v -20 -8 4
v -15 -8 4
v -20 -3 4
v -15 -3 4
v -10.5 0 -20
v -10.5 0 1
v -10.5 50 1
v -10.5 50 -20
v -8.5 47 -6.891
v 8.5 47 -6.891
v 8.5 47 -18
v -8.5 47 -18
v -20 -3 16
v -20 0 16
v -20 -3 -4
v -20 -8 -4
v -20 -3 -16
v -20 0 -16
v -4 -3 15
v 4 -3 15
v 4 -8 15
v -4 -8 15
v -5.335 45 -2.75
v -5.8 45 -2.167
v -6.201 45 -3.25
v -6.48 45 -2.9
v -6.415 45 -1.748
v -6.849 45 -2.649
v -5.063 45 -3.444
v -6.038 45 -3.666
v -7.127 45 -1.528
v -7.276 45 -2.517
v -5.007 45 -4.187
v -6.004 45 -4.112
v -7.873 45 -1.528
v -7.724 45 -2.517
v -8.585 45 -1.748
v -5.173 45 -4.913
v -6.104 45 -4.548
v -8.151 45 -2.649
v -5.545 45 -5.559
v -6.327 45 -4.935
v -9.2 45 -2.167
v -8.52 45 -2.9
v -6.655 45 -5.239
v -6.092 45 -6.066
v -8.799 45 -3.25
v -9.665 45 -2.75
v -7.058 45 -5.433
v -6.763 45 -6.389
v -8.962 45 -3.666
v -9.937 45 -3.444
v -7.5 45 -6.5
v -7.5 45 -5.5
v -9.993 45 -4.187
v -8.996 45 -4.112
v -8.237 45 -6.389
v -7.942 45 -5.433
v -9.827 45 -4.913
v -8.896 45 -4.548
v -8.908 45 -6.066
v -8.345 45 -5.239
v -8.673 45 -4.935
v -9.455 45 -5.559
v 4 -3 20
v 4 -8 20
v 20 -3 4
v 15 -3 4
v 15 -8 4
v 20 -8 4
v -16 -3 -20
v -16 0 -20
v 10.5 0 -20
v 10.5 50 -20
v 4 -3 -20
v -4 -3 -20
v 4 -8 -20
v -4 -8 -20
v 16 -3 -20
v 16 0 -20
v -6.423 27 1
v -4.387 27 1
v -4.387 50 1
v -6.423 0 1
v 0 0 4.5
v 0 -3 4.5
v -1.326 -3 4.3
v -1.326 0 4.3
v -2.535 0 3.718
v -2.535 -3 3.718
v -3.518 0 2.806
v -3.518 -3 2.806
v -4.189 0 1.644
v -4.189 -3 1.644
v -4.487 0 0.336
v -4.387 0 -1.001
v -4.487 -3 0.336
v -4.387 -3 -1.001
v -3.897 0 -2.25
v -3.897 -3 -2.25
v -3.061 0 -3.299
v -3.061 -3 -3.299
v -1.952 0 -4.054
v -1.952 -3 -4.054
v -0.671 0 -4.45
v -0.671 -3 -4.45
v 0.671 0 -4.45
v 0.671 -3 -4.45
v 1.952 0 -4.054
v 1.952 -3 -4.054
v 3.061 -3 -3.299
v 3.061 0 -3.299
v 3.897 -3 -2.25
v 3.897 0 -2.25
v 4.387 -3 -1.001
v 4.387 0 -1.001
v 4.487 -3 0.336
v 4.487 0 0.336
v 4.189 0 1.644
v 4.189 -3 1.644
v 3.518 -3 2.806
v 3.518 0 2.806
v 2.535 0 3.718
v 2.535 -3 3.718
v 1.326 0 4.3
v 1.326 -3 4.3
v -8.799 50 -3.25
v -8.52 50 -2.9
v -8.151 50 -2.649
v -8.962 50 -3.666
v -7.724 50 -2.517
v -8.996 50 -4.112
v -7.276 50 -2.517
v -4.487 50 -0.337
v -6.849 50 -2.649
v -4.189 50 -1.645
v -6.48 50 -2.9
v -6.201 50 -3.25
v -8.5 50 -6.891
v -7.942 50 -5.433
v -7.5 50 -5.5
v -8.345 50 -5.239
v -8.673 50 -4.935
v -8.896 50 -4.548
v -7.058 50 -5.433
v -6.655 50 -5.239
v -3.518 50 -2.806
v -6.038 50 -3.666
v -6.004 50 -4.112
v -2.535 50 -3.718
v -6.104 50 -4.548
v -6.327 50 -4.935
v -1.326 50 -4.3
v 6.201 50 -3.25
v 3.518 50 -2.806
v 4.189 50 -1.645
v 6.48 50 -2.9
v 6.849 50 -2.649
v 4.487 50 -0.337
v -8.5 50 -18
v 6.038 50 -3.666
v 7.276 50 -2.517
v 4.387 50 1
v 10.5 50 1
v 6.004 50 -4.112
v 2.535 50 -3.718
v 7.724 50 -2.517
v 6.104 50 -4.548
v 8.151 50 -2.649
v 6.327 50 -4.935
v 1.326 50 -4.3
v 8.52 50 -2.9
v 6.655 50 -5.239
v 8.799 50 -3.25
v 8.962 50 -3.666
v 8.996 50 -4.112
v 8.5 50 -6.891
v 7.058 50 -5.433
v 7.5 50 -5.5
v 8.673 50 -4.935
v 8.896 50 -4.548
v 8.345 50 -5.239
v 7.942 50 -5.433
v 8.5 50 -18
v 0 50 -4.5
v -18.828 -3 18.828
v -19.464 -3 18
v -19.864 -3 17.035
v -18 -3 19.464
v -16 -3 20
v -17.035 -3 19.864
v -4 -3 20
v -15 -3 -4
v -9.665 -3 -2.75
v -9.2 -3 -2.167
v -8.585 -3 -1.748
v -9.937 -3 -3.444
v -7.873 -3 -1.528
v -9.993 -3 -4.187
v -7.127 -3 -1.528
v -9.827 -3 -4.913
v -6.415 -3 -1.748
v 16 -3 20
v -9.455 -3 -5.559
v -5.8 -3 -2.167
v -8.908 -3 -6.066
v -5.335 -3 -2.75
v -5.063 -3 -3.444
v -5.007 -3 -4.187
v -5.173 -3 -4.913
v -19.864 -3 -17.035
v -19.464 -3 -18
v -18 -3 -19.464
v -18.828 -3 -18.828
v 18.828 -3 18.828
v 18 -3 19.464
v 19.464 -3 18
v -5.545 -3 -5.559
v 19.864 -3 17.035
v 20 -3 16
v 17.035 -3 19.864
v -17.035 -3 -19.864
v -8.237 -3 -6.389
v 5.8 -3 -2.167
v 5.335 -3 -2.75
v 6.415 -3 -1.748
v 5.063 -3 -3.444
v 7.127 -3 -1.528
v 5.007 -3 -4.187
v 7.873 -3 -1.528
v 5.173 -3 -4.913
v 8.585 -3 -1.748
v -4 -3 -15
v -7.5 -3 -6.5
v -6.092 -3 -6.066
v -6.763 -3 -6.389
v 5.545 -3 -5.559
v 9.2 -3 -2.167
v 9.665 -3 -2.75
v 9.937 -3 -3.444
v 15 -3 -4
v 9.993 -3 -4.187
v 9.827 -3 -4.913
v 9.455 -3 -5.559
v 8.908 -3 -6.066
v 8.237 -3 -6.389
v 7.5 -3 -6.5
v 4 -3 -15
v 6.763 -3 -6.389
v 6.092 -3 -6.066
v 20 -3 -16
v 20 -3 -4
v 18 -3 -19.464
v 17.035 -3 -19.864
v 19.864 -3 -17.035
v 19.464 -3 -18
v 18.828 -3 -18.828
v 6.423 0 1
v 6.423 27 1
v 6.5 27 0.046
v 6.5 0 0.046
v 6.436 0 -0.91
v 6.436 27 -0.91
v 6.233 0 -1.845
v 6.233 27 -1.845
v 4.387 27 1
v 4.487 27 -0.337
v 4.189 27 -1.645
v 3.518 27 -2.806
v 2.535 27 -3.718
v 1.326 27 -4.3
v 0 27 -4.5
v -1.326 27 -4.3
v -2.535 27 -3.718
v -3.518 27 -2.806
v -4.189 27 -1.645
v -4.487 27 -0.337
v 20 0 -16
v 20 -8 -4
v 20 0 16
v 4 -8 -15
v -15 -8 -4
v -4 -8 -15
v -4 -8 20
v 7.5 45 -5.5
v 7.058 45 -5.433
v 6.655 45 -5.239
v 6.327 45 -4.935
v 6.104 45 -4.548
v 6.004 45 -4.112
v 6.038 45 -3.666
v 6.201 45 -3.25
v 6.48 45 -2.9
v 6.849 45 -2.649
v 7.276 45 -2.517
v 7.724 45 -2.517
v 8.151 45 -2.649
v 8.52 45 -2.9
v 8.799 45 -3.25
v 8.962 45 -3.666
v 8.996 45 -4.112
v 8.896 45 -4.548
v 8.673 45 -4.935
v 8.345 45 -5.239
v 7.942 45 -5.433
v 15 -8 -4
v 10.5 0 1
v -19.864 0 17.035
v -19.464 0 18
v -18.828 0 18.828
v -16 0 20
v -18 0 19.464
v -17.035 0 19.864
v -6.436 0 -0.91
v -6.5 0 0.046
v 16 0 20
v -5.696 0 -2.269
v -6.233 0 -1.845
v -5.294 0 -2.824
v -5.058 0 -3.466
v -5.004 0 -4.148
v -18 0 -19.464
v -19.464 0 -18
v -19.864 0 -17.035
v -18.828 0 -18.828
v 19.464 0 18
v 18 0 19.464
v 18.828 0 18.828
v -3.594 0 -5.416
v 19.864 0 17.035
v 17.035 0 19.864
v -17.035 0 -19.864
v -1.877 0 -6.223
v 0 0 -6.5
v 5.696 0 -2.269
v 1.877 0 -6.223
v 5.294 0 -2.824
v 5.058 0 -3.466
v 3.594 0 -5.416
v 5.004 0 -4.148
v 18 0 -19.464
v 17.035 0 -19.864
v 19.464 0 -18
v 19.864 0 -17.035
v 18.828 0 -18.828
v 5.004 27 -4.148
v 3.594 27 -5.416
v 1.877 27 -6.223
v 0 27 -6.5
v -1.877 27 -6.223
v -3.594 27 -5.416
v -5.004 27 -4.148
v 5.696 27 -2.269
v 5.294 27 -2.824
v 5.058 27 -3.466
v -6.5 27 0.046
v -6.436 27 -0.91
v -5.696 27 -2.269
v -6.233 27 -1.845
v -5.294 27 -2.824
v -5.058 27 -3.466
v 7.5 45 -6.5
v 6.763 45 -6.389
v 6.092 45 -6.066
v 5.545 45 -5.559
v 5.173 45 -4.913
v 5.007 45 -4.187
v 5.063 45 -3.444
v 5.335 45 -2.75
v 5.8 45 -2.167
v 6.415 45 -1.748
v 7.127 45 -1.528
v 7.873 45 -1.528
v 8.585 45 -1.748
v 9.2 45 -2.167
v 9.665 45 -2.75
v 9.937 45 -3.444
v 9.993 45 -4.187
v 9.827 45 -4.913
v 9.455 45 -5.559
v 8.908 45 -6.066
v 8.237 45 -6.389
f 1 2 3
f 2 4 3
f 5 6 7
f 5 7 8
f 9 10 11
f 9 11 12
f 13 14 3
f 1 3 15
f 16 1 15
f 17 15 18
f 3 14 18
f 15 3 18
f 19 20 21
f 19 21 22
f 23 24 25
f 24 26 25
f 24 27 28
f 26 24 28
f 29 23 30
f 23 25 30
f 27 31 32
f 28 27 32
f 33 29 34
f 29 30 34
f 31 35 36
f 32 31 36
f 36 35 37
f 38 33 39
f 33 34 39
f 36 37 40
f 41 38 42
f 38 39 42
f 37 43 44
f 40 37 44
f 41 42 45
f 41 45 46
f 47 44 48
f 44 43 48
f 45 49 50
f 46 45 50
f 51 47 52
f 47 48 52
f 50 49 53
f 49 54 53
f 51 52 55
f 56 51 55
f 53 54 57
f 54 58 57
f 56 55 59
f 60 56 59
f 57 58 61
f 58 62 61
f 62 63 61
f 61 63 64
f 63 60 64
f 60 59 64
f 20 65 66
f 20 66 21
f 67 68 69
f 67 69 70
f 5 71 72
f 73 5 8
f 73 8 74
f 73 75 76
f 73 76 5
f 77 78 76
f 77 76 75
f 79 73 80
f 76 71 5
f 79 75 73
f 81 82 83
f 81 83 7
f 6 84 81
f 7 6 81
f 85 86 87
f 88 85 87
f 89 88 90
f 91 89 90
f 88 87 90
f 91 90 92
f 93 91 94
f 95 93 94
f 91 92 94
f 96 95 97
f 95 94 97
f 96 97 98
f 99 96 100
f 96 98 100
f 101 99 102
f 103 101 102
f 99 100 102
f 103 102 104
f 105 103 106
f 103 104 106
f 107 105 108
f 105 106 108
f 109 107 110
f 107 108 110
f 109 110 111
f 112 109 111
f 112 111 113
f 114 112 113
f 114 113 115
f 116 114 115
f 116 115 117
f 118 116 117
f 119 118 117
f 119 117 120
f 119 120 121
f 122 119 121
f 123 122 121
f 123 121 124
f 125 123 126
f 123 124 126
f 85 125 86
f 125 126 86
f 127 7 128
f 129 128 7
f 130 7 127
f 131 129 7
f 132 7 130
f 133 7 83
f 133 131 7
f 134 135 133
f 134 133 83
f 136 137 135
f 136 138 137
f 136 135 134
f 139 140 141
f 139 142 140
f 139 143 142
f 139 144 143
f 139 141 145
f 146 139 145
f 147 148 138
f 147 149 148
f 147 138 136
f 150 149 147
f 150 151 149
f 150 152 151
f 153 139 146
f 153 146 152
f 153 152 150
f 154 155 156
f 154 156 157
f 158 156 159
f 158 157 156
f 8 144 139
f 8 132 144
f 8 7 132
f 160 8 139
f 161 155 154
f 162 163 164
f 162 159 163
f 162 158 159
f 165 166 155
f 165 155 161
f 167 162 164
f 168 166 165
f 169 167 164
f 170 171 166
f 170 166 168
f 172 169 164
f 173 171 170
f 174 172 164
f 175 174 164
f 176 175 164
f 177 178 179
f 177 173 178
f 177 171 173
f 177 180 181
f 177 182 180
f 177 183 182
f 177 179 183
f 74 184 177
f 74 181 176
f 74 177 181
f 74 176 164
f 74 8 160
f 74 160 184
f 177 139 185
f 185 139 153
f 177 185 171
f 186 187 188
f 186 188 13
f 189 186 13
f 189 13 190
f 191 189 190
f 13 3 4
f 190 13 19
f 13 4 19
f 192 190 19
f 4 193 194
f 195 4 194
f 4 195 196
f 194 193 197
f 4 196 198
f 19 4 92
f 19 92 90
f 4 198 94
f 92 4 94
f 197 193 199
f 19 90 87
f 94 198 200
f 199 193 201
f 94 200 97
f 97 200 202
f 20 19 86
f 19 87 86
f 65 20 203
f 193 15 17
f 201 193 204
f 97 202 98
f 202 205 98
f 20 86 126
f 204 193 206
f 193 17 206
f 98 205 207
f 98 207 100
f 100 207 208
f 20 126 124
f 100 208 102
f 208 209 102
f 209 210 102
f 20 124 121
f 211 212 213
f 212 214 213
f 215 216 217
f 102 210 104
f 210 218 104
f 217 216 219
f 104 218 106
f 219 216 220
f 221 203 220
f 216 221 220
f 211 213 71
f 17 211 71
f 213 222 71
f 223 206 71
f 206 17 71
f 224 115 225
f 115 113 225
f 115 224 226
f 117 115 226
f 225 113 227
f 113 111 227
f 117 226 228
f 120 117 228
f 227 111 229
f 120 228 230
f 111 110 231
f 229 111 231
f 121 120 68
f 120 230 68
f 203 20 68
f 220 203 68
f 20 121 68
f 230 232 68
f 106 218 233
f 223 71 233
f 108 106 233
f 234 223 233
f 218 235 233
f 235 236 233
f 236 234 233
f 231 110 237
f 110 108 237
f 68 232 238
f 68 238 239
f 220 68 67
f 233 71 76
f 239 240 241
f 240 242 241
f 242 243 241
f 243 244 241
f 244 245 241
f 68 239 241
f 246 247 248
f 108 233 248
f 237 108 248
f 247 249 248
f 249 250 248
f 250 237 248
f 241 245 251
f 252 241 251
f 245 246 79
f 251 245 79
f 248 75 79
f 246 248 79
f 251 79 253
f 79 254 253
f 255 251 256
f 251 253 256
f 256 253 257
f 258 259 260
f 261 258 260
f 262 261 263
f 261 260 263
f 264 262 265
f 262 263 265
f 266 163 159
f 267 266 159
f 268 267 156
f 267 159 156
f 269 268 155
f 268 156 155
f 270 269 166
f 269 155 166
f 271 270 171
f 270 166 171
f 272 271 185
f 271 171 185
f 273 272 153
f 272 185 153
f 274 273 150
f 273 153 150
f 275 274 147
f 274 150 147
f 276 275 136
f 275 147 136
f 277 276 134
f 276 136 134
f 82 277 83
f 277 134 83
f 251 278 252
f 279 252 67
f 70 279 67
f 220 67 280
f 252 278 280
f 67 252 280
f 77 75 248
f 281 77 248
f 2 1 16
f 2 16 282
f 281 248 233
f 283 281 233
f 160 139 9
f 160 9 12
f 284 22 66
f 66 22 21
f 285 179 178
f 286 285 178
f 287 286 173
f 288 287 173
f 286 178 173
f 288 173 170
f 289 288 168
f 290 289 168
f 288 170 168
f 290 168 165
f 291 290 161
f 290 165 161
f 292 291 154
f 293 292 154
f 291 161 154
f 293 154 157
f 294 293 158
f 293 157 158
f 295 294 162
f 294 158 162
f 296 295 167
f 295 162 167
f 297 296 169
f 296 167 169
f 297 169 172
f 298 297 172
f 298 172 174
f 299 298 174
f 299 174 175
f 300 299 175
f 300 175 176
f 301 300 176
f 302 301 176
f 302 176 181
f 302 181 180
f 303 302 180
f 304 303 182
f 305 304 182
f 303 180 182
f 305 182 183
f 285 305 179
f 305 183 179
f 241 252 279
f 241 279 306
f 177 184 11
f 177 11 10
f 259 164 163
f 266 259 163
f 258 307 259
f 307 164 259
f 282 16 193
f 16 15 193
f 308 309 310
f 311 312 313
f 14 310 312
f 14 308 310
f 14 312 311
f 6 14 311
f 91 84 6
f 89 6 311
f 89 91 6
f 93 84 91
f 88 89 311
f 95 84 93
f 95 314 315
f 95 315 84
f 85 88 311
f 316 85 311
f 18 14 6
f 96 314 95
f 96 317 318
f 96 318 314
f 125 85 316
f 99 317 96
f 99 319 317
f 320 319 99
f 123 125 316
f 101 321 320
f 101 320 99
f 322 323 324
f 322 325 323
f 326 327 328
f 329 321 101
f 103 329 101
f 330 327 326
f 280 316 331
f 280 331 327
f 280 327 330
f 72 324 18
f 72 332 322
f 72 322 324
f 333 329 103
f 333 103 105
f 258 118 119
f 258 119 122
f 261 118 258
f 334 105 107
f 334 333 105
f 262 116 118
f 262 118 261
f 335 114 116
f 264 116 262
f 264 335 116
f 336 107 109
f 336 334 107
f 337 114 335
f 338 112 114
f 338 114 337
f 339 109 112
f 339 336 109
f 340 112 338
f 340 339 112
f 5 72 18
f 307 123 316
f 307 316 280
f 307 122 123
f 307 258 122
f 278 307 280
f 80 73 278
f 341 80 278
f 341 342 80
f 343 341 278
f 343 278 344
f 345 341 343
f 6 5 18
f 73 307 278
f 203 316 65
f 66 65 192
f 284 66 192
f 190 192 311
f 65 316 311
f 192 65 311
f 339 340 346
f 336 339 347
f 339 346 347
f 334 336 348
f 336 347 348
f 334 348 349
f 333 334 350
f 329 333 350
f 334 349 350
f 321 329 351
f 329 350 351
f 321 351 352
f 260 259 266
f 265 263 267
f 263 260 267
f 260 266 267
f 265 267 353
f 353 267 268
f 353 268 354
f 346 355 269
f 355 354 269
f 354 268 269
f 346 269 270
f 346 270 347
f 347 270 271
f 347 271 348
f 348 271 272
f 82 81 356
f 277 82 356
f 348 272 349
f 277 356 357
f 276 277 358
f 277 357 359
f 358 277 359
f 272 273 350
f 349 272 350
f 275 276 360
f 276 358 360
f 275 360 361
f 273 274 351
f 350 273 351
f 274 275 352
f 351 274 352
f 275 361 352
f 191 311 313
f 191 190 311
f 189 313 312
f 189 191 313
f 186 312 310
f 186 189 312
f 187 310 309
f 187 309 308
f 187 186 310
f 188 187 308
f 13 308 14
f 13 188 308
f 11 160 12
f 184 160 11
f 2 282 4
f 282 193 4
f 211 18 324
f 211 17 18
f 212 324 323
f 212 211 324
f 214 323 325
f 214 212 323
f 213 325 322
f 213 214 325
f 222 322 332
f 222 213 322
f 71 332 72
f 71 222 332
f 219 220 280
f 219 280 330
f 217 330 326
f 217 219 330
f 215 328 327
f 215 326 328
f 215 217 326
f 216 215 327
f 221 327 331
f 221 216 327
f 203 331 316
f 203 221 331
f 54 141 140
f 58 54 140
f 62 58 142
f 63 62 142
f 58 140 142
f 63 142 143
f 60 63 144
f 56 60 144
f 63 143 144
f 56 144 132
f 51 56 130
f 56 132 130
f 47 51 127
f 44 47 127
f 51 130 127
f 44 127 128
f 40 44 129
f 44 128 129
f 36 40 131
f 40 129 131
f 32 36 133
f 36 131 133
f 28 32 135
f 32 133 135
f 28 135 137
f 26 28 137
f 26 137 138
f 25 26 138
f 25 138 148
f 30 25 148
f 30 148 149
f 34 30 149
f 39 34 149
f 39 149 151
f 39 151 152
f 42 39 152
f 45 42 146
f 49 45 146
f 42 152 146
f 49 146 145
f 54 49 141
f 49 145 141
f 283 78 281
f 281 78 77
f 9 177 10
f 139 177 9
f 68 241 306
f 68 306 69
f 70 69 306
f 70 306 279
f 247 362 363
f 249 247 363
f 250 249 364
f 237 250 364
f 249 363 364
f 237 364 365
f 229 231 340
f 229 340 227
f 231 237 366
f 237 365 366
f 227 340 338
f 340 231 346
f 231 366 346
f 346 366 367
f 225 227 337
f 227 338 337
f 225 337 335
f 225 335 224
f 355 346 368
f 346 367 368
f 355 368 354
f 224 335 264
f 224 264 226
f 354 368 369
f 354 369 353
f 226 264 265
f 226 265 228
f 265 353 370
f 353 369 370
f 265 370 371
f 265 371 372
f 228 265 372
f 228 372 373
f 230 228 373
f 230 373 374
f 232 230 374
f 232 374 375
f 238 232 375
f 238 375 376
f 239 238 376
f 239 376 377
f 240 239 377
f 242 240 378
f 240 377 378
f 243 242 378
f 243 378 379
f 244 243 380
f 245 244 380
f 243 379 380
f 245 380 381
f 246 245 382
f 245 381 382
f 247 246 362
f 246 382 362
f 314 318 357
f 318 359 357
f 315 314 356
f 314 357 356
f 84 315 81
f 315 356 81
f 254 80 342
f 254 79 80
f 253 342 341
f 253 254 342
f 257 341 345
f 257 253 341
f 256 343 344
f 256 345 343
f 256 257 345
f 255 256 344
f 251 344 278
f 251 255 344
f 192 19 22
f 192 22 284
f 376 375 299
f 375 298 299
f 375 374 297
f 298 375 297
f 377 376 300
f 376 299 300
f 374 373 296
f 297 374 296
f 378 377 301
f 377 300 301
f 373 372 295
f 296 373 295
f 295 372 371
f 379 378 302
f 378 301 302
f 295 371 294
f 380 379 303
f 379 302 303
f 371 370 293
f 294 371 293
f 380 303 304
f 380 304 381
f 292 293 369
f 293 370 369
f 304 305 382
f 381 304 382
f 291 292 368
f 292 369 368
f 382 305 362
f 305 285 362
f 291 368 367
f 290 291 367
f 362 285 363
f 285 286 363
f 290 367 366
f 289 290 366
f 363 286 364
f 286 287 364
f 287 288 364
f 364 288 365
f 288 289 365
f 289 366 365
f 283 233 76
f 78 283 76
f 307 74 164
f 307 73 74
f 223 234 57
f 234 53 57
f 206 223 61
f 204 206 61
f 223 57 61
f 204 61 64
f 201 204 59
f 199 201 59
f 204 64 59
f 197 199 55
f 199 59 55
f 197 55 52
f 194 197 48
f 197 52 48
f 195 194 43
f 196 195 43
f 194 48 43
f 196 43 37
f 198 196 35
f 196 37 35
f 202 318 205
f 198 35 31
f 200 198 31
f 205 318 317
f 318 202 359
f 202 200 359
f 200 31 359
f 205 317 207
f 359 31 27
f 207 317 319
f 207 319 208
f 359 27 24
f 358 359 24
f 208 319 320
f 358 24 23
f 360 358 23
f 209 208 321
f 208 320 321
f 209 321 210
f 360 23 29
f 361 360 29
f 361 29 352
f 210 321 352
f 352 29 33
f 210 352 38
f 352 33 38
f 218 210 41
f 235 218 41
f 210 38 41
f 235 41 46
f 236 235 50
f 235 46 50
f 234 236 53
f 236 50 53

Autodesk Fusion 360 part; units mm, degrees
sketch "Sketch1" plane through (0, 0, 0) normal (0, 1, 0) x (1, 0, 0)
  line L0 (20, -20) -> (-20, -20)
  line L1 (-20, -20) -> (-20, 20)
  line L2 (-20, 20) -> (20, 20)
  line L3 (20, 20) -> (20, -20)
  line L4 (20, -20) -> (-20, 20) construction
  line L5 (-20, -20) -> (20, 20) construction
  line L6 (-20, 4) -> (-15, 4)
  line L7 (-15, 4) -> (-15, -4)
  line L8 (-15, -4) -> (-20, -4)
  line L9 (-20, -4) -> (-20, 4)
  line L10 (-4, 20) -> (4, 20)
  line L11 (4, 20) -> (4, 15)
  line L12 (4, 15) -> (-4, 15)
  line L13 (-4, 15) -> (-4, 20)
  line L14 (20, 4) -> (15, 4)
  line L15 (15, 4) -> (15, -4)
  line L16 (15, -4) -> (20, -4)
  line L17 (20, -4) -> (20, 4)
  line L18 (-4, -20) -> (4, -20)
  line L19 (4, -20) -> (4, -15)
  line L20 (4, -15) -> (-4, -15)
  line L21 (-4, -15) -> (-4, -20)
  dimension "d1" = 40
  dimension "d2" = 40
  dimension "d3" = 5
  dimension "d4" = 8
  dimension "d5" = 16
  dimension "d6" = 5
  dimension "d7" = 16
  dimension "d8" = 8
  dimension "d9" = 5
  dimension "d10" = 5
  dimension "d11" = 8
  dimension "d12" = 8
  dimension "d13" = 16
  dimension "d14" = 16
extrude "Extrude1" add sketch "Sketch1" against normal blind 3 contours L0 L1 L2 L3 L6 L7 L8 L11 L12 L13 L14 L15 L16 L19 L20 L21
extrude "Extrude2" add sketch "Sketch1" against normal blind 8 contours L0 L18 L19 L20 L21 | L3 L14 L15 L16 L17 | L1 L6 L7 L8 L9 | L2 L10 L11 L12 L13
hole "Hole1" at (0, 0, 0) direction (0, -1, 0) diameter 9 depth 30 tip angle 118
fillet "Fillet1" radius 4 4 edges at (20, -1.5, -20) (-20, -1.5, -20) (20, -1.5, 20) (-20, -1.5, 20)
sketch "Sketch2" plane through (0, 0, 0) normal (0, 1, 0) x (1, 0, 0)
  line L0 (-10.5, 20) -> (10.5, 20)
  line L1 (10.5, 20) -> (10.5, -1)
  line L2 (10.5, -1) -> (-10.5, -1)
  line L3 (-10.5, -1) -> (-10.5, 20)
  point P0 (-20, 20)
  dimension "d24" = 21
  dimension "d25" = 21
  dimension "d26" = 9.5
extrude "Extrude3" add sketch "Sketch2" along normal blind 50
hole "Hole2" at (0, 0, 0) direction (0, 1, 0) diameter 9 depth 55 tip angle 118 counterbore diameter 13 counterbore depth 27
sketch "Sketch3" plane through (0, -3, 0) normal (0, -1, 0) x (1, 0, 0)
  arc A0 (-16, 20) -> (-20, 16) centre (-16, 16) ccw
  line L0 (-20, 16) -> (-20, 4)
  line L1 (-20, 4) -> (-15, 4)
  line L2 (-15, 4) -> (-15, -4)
  line L3 (-15, -4) -> (-20, -4)
  line L4 (-20, -4) -> (-20, -16)
  arc A1 (-20, -16) -> (-16, -20) centre (-16, -16) ccw
  line L5 (-16, -20) -> (-4, -20)
  line L6 (-4, -20) -> (-4, -15)
  line L7 (-4, -15) -> (4, -15)
  line L8 (4, -15) -> (4, -20)
  line L9 (4, -20) -> (16, -20)
  arc A2 (16, -20) -> (20, -16) centre (16, -16) ccw
  line L10 (20, -16) -> (20, -4)
  line L11 (20, -4) -> (15, -4)
  line L12 (15, -4) -> (15, 4)
  line L13 (15, 4) -> (20, 4)
  line L14 (20, 4) -> (20, 16)
  arc A3 (20, 16) -> (16, 20) centre (16, 16) ccw
  line L15 (16, 20) -> (4, 20)
  line L16 (4, 20) -> (4, 15)
  line L17 (4, 15) -> (-4, 15)
  line L18 (-4, 15) -> (-4, 20)
  line L19 (-4, 20) -> (-16, 20)
  circle A4 centre (0, 0) radius 4.5
  point P0 (-7.5, -4)
  point P1 (7.5, -4)
  dimension "d34" = 16
  dimension "d35" = 15
  dimension "d36" = 12.5
hole "Hole3" at (7.5, -3, -4) at (-7.5, -3, -4) direction (0, 1, 0) diameter 3 depth 55 tip angle 118 counterbore diameter 5 counterbore depth 48
sketch "Sketch4" plane through (0, 50, 0) normal (0, 1, 0) x (-1, 0, 0)
  circle A0 centre (-7.5, -4) radius 1.5
  circle A1 centre (7.5, -4) radius 1.5
  arc A2 (-4.3875, 1) -> (4.3875, 1) centre (0, 0) ccw
  line L0 (-4.3875, 1) -> (-10.5, 1)
  line L1 (-10.5, 1) -> (-10.5, -20)
  line L2 (-10.5, -20) -> (10.5, -20)
  line L3 (10.5, -20) -> (10.5, 1)
  line L4 (10.5, 1) -> (4.3875, 1)
  line L5 (10.5, -20) -> (-10.5, -20)
  line L6 (-10.5, -20) -> (-10.5, 1)
  line L7 (-10.5, 1) -> (10.5, 1)
  line L8 (10.5, 1) -> (10.5, -20)
  line L9 (-8.5, -18) -> (-8.5, -1)
  line L10 (-8.5, -1) -> (8.5, -1)
  line L11 (8.5, -1) -> (8.5, -18)
  line L12 (8.5, -18) -> (-8.5, -18)
  line L13 (8.5, -18) -> (-8.5, -18)
  line L14 (-8.5, -18) -> (-8.5, -6.8913)
  line L15 (-8.5, -6.8913) -> (8.5, -6.8913)
  line L16 (8.5, -6.8913) -> (8.5, -18)
  dimension "d42" = 2
extrude "Extrude4" cut sketch "Sketch4" against normal blind 3 contours L9 L11 L12 L13 L14 L15 L16
equation "d6 = d3"
equation "d7 = d5"
equation "d8 = d4"
equation "d9 = d3"
equation "d10 = d3"
equation "d11 = d4"
equation "d12 = d4"
equation "d13 = d7"
equation "d14 = d7"
